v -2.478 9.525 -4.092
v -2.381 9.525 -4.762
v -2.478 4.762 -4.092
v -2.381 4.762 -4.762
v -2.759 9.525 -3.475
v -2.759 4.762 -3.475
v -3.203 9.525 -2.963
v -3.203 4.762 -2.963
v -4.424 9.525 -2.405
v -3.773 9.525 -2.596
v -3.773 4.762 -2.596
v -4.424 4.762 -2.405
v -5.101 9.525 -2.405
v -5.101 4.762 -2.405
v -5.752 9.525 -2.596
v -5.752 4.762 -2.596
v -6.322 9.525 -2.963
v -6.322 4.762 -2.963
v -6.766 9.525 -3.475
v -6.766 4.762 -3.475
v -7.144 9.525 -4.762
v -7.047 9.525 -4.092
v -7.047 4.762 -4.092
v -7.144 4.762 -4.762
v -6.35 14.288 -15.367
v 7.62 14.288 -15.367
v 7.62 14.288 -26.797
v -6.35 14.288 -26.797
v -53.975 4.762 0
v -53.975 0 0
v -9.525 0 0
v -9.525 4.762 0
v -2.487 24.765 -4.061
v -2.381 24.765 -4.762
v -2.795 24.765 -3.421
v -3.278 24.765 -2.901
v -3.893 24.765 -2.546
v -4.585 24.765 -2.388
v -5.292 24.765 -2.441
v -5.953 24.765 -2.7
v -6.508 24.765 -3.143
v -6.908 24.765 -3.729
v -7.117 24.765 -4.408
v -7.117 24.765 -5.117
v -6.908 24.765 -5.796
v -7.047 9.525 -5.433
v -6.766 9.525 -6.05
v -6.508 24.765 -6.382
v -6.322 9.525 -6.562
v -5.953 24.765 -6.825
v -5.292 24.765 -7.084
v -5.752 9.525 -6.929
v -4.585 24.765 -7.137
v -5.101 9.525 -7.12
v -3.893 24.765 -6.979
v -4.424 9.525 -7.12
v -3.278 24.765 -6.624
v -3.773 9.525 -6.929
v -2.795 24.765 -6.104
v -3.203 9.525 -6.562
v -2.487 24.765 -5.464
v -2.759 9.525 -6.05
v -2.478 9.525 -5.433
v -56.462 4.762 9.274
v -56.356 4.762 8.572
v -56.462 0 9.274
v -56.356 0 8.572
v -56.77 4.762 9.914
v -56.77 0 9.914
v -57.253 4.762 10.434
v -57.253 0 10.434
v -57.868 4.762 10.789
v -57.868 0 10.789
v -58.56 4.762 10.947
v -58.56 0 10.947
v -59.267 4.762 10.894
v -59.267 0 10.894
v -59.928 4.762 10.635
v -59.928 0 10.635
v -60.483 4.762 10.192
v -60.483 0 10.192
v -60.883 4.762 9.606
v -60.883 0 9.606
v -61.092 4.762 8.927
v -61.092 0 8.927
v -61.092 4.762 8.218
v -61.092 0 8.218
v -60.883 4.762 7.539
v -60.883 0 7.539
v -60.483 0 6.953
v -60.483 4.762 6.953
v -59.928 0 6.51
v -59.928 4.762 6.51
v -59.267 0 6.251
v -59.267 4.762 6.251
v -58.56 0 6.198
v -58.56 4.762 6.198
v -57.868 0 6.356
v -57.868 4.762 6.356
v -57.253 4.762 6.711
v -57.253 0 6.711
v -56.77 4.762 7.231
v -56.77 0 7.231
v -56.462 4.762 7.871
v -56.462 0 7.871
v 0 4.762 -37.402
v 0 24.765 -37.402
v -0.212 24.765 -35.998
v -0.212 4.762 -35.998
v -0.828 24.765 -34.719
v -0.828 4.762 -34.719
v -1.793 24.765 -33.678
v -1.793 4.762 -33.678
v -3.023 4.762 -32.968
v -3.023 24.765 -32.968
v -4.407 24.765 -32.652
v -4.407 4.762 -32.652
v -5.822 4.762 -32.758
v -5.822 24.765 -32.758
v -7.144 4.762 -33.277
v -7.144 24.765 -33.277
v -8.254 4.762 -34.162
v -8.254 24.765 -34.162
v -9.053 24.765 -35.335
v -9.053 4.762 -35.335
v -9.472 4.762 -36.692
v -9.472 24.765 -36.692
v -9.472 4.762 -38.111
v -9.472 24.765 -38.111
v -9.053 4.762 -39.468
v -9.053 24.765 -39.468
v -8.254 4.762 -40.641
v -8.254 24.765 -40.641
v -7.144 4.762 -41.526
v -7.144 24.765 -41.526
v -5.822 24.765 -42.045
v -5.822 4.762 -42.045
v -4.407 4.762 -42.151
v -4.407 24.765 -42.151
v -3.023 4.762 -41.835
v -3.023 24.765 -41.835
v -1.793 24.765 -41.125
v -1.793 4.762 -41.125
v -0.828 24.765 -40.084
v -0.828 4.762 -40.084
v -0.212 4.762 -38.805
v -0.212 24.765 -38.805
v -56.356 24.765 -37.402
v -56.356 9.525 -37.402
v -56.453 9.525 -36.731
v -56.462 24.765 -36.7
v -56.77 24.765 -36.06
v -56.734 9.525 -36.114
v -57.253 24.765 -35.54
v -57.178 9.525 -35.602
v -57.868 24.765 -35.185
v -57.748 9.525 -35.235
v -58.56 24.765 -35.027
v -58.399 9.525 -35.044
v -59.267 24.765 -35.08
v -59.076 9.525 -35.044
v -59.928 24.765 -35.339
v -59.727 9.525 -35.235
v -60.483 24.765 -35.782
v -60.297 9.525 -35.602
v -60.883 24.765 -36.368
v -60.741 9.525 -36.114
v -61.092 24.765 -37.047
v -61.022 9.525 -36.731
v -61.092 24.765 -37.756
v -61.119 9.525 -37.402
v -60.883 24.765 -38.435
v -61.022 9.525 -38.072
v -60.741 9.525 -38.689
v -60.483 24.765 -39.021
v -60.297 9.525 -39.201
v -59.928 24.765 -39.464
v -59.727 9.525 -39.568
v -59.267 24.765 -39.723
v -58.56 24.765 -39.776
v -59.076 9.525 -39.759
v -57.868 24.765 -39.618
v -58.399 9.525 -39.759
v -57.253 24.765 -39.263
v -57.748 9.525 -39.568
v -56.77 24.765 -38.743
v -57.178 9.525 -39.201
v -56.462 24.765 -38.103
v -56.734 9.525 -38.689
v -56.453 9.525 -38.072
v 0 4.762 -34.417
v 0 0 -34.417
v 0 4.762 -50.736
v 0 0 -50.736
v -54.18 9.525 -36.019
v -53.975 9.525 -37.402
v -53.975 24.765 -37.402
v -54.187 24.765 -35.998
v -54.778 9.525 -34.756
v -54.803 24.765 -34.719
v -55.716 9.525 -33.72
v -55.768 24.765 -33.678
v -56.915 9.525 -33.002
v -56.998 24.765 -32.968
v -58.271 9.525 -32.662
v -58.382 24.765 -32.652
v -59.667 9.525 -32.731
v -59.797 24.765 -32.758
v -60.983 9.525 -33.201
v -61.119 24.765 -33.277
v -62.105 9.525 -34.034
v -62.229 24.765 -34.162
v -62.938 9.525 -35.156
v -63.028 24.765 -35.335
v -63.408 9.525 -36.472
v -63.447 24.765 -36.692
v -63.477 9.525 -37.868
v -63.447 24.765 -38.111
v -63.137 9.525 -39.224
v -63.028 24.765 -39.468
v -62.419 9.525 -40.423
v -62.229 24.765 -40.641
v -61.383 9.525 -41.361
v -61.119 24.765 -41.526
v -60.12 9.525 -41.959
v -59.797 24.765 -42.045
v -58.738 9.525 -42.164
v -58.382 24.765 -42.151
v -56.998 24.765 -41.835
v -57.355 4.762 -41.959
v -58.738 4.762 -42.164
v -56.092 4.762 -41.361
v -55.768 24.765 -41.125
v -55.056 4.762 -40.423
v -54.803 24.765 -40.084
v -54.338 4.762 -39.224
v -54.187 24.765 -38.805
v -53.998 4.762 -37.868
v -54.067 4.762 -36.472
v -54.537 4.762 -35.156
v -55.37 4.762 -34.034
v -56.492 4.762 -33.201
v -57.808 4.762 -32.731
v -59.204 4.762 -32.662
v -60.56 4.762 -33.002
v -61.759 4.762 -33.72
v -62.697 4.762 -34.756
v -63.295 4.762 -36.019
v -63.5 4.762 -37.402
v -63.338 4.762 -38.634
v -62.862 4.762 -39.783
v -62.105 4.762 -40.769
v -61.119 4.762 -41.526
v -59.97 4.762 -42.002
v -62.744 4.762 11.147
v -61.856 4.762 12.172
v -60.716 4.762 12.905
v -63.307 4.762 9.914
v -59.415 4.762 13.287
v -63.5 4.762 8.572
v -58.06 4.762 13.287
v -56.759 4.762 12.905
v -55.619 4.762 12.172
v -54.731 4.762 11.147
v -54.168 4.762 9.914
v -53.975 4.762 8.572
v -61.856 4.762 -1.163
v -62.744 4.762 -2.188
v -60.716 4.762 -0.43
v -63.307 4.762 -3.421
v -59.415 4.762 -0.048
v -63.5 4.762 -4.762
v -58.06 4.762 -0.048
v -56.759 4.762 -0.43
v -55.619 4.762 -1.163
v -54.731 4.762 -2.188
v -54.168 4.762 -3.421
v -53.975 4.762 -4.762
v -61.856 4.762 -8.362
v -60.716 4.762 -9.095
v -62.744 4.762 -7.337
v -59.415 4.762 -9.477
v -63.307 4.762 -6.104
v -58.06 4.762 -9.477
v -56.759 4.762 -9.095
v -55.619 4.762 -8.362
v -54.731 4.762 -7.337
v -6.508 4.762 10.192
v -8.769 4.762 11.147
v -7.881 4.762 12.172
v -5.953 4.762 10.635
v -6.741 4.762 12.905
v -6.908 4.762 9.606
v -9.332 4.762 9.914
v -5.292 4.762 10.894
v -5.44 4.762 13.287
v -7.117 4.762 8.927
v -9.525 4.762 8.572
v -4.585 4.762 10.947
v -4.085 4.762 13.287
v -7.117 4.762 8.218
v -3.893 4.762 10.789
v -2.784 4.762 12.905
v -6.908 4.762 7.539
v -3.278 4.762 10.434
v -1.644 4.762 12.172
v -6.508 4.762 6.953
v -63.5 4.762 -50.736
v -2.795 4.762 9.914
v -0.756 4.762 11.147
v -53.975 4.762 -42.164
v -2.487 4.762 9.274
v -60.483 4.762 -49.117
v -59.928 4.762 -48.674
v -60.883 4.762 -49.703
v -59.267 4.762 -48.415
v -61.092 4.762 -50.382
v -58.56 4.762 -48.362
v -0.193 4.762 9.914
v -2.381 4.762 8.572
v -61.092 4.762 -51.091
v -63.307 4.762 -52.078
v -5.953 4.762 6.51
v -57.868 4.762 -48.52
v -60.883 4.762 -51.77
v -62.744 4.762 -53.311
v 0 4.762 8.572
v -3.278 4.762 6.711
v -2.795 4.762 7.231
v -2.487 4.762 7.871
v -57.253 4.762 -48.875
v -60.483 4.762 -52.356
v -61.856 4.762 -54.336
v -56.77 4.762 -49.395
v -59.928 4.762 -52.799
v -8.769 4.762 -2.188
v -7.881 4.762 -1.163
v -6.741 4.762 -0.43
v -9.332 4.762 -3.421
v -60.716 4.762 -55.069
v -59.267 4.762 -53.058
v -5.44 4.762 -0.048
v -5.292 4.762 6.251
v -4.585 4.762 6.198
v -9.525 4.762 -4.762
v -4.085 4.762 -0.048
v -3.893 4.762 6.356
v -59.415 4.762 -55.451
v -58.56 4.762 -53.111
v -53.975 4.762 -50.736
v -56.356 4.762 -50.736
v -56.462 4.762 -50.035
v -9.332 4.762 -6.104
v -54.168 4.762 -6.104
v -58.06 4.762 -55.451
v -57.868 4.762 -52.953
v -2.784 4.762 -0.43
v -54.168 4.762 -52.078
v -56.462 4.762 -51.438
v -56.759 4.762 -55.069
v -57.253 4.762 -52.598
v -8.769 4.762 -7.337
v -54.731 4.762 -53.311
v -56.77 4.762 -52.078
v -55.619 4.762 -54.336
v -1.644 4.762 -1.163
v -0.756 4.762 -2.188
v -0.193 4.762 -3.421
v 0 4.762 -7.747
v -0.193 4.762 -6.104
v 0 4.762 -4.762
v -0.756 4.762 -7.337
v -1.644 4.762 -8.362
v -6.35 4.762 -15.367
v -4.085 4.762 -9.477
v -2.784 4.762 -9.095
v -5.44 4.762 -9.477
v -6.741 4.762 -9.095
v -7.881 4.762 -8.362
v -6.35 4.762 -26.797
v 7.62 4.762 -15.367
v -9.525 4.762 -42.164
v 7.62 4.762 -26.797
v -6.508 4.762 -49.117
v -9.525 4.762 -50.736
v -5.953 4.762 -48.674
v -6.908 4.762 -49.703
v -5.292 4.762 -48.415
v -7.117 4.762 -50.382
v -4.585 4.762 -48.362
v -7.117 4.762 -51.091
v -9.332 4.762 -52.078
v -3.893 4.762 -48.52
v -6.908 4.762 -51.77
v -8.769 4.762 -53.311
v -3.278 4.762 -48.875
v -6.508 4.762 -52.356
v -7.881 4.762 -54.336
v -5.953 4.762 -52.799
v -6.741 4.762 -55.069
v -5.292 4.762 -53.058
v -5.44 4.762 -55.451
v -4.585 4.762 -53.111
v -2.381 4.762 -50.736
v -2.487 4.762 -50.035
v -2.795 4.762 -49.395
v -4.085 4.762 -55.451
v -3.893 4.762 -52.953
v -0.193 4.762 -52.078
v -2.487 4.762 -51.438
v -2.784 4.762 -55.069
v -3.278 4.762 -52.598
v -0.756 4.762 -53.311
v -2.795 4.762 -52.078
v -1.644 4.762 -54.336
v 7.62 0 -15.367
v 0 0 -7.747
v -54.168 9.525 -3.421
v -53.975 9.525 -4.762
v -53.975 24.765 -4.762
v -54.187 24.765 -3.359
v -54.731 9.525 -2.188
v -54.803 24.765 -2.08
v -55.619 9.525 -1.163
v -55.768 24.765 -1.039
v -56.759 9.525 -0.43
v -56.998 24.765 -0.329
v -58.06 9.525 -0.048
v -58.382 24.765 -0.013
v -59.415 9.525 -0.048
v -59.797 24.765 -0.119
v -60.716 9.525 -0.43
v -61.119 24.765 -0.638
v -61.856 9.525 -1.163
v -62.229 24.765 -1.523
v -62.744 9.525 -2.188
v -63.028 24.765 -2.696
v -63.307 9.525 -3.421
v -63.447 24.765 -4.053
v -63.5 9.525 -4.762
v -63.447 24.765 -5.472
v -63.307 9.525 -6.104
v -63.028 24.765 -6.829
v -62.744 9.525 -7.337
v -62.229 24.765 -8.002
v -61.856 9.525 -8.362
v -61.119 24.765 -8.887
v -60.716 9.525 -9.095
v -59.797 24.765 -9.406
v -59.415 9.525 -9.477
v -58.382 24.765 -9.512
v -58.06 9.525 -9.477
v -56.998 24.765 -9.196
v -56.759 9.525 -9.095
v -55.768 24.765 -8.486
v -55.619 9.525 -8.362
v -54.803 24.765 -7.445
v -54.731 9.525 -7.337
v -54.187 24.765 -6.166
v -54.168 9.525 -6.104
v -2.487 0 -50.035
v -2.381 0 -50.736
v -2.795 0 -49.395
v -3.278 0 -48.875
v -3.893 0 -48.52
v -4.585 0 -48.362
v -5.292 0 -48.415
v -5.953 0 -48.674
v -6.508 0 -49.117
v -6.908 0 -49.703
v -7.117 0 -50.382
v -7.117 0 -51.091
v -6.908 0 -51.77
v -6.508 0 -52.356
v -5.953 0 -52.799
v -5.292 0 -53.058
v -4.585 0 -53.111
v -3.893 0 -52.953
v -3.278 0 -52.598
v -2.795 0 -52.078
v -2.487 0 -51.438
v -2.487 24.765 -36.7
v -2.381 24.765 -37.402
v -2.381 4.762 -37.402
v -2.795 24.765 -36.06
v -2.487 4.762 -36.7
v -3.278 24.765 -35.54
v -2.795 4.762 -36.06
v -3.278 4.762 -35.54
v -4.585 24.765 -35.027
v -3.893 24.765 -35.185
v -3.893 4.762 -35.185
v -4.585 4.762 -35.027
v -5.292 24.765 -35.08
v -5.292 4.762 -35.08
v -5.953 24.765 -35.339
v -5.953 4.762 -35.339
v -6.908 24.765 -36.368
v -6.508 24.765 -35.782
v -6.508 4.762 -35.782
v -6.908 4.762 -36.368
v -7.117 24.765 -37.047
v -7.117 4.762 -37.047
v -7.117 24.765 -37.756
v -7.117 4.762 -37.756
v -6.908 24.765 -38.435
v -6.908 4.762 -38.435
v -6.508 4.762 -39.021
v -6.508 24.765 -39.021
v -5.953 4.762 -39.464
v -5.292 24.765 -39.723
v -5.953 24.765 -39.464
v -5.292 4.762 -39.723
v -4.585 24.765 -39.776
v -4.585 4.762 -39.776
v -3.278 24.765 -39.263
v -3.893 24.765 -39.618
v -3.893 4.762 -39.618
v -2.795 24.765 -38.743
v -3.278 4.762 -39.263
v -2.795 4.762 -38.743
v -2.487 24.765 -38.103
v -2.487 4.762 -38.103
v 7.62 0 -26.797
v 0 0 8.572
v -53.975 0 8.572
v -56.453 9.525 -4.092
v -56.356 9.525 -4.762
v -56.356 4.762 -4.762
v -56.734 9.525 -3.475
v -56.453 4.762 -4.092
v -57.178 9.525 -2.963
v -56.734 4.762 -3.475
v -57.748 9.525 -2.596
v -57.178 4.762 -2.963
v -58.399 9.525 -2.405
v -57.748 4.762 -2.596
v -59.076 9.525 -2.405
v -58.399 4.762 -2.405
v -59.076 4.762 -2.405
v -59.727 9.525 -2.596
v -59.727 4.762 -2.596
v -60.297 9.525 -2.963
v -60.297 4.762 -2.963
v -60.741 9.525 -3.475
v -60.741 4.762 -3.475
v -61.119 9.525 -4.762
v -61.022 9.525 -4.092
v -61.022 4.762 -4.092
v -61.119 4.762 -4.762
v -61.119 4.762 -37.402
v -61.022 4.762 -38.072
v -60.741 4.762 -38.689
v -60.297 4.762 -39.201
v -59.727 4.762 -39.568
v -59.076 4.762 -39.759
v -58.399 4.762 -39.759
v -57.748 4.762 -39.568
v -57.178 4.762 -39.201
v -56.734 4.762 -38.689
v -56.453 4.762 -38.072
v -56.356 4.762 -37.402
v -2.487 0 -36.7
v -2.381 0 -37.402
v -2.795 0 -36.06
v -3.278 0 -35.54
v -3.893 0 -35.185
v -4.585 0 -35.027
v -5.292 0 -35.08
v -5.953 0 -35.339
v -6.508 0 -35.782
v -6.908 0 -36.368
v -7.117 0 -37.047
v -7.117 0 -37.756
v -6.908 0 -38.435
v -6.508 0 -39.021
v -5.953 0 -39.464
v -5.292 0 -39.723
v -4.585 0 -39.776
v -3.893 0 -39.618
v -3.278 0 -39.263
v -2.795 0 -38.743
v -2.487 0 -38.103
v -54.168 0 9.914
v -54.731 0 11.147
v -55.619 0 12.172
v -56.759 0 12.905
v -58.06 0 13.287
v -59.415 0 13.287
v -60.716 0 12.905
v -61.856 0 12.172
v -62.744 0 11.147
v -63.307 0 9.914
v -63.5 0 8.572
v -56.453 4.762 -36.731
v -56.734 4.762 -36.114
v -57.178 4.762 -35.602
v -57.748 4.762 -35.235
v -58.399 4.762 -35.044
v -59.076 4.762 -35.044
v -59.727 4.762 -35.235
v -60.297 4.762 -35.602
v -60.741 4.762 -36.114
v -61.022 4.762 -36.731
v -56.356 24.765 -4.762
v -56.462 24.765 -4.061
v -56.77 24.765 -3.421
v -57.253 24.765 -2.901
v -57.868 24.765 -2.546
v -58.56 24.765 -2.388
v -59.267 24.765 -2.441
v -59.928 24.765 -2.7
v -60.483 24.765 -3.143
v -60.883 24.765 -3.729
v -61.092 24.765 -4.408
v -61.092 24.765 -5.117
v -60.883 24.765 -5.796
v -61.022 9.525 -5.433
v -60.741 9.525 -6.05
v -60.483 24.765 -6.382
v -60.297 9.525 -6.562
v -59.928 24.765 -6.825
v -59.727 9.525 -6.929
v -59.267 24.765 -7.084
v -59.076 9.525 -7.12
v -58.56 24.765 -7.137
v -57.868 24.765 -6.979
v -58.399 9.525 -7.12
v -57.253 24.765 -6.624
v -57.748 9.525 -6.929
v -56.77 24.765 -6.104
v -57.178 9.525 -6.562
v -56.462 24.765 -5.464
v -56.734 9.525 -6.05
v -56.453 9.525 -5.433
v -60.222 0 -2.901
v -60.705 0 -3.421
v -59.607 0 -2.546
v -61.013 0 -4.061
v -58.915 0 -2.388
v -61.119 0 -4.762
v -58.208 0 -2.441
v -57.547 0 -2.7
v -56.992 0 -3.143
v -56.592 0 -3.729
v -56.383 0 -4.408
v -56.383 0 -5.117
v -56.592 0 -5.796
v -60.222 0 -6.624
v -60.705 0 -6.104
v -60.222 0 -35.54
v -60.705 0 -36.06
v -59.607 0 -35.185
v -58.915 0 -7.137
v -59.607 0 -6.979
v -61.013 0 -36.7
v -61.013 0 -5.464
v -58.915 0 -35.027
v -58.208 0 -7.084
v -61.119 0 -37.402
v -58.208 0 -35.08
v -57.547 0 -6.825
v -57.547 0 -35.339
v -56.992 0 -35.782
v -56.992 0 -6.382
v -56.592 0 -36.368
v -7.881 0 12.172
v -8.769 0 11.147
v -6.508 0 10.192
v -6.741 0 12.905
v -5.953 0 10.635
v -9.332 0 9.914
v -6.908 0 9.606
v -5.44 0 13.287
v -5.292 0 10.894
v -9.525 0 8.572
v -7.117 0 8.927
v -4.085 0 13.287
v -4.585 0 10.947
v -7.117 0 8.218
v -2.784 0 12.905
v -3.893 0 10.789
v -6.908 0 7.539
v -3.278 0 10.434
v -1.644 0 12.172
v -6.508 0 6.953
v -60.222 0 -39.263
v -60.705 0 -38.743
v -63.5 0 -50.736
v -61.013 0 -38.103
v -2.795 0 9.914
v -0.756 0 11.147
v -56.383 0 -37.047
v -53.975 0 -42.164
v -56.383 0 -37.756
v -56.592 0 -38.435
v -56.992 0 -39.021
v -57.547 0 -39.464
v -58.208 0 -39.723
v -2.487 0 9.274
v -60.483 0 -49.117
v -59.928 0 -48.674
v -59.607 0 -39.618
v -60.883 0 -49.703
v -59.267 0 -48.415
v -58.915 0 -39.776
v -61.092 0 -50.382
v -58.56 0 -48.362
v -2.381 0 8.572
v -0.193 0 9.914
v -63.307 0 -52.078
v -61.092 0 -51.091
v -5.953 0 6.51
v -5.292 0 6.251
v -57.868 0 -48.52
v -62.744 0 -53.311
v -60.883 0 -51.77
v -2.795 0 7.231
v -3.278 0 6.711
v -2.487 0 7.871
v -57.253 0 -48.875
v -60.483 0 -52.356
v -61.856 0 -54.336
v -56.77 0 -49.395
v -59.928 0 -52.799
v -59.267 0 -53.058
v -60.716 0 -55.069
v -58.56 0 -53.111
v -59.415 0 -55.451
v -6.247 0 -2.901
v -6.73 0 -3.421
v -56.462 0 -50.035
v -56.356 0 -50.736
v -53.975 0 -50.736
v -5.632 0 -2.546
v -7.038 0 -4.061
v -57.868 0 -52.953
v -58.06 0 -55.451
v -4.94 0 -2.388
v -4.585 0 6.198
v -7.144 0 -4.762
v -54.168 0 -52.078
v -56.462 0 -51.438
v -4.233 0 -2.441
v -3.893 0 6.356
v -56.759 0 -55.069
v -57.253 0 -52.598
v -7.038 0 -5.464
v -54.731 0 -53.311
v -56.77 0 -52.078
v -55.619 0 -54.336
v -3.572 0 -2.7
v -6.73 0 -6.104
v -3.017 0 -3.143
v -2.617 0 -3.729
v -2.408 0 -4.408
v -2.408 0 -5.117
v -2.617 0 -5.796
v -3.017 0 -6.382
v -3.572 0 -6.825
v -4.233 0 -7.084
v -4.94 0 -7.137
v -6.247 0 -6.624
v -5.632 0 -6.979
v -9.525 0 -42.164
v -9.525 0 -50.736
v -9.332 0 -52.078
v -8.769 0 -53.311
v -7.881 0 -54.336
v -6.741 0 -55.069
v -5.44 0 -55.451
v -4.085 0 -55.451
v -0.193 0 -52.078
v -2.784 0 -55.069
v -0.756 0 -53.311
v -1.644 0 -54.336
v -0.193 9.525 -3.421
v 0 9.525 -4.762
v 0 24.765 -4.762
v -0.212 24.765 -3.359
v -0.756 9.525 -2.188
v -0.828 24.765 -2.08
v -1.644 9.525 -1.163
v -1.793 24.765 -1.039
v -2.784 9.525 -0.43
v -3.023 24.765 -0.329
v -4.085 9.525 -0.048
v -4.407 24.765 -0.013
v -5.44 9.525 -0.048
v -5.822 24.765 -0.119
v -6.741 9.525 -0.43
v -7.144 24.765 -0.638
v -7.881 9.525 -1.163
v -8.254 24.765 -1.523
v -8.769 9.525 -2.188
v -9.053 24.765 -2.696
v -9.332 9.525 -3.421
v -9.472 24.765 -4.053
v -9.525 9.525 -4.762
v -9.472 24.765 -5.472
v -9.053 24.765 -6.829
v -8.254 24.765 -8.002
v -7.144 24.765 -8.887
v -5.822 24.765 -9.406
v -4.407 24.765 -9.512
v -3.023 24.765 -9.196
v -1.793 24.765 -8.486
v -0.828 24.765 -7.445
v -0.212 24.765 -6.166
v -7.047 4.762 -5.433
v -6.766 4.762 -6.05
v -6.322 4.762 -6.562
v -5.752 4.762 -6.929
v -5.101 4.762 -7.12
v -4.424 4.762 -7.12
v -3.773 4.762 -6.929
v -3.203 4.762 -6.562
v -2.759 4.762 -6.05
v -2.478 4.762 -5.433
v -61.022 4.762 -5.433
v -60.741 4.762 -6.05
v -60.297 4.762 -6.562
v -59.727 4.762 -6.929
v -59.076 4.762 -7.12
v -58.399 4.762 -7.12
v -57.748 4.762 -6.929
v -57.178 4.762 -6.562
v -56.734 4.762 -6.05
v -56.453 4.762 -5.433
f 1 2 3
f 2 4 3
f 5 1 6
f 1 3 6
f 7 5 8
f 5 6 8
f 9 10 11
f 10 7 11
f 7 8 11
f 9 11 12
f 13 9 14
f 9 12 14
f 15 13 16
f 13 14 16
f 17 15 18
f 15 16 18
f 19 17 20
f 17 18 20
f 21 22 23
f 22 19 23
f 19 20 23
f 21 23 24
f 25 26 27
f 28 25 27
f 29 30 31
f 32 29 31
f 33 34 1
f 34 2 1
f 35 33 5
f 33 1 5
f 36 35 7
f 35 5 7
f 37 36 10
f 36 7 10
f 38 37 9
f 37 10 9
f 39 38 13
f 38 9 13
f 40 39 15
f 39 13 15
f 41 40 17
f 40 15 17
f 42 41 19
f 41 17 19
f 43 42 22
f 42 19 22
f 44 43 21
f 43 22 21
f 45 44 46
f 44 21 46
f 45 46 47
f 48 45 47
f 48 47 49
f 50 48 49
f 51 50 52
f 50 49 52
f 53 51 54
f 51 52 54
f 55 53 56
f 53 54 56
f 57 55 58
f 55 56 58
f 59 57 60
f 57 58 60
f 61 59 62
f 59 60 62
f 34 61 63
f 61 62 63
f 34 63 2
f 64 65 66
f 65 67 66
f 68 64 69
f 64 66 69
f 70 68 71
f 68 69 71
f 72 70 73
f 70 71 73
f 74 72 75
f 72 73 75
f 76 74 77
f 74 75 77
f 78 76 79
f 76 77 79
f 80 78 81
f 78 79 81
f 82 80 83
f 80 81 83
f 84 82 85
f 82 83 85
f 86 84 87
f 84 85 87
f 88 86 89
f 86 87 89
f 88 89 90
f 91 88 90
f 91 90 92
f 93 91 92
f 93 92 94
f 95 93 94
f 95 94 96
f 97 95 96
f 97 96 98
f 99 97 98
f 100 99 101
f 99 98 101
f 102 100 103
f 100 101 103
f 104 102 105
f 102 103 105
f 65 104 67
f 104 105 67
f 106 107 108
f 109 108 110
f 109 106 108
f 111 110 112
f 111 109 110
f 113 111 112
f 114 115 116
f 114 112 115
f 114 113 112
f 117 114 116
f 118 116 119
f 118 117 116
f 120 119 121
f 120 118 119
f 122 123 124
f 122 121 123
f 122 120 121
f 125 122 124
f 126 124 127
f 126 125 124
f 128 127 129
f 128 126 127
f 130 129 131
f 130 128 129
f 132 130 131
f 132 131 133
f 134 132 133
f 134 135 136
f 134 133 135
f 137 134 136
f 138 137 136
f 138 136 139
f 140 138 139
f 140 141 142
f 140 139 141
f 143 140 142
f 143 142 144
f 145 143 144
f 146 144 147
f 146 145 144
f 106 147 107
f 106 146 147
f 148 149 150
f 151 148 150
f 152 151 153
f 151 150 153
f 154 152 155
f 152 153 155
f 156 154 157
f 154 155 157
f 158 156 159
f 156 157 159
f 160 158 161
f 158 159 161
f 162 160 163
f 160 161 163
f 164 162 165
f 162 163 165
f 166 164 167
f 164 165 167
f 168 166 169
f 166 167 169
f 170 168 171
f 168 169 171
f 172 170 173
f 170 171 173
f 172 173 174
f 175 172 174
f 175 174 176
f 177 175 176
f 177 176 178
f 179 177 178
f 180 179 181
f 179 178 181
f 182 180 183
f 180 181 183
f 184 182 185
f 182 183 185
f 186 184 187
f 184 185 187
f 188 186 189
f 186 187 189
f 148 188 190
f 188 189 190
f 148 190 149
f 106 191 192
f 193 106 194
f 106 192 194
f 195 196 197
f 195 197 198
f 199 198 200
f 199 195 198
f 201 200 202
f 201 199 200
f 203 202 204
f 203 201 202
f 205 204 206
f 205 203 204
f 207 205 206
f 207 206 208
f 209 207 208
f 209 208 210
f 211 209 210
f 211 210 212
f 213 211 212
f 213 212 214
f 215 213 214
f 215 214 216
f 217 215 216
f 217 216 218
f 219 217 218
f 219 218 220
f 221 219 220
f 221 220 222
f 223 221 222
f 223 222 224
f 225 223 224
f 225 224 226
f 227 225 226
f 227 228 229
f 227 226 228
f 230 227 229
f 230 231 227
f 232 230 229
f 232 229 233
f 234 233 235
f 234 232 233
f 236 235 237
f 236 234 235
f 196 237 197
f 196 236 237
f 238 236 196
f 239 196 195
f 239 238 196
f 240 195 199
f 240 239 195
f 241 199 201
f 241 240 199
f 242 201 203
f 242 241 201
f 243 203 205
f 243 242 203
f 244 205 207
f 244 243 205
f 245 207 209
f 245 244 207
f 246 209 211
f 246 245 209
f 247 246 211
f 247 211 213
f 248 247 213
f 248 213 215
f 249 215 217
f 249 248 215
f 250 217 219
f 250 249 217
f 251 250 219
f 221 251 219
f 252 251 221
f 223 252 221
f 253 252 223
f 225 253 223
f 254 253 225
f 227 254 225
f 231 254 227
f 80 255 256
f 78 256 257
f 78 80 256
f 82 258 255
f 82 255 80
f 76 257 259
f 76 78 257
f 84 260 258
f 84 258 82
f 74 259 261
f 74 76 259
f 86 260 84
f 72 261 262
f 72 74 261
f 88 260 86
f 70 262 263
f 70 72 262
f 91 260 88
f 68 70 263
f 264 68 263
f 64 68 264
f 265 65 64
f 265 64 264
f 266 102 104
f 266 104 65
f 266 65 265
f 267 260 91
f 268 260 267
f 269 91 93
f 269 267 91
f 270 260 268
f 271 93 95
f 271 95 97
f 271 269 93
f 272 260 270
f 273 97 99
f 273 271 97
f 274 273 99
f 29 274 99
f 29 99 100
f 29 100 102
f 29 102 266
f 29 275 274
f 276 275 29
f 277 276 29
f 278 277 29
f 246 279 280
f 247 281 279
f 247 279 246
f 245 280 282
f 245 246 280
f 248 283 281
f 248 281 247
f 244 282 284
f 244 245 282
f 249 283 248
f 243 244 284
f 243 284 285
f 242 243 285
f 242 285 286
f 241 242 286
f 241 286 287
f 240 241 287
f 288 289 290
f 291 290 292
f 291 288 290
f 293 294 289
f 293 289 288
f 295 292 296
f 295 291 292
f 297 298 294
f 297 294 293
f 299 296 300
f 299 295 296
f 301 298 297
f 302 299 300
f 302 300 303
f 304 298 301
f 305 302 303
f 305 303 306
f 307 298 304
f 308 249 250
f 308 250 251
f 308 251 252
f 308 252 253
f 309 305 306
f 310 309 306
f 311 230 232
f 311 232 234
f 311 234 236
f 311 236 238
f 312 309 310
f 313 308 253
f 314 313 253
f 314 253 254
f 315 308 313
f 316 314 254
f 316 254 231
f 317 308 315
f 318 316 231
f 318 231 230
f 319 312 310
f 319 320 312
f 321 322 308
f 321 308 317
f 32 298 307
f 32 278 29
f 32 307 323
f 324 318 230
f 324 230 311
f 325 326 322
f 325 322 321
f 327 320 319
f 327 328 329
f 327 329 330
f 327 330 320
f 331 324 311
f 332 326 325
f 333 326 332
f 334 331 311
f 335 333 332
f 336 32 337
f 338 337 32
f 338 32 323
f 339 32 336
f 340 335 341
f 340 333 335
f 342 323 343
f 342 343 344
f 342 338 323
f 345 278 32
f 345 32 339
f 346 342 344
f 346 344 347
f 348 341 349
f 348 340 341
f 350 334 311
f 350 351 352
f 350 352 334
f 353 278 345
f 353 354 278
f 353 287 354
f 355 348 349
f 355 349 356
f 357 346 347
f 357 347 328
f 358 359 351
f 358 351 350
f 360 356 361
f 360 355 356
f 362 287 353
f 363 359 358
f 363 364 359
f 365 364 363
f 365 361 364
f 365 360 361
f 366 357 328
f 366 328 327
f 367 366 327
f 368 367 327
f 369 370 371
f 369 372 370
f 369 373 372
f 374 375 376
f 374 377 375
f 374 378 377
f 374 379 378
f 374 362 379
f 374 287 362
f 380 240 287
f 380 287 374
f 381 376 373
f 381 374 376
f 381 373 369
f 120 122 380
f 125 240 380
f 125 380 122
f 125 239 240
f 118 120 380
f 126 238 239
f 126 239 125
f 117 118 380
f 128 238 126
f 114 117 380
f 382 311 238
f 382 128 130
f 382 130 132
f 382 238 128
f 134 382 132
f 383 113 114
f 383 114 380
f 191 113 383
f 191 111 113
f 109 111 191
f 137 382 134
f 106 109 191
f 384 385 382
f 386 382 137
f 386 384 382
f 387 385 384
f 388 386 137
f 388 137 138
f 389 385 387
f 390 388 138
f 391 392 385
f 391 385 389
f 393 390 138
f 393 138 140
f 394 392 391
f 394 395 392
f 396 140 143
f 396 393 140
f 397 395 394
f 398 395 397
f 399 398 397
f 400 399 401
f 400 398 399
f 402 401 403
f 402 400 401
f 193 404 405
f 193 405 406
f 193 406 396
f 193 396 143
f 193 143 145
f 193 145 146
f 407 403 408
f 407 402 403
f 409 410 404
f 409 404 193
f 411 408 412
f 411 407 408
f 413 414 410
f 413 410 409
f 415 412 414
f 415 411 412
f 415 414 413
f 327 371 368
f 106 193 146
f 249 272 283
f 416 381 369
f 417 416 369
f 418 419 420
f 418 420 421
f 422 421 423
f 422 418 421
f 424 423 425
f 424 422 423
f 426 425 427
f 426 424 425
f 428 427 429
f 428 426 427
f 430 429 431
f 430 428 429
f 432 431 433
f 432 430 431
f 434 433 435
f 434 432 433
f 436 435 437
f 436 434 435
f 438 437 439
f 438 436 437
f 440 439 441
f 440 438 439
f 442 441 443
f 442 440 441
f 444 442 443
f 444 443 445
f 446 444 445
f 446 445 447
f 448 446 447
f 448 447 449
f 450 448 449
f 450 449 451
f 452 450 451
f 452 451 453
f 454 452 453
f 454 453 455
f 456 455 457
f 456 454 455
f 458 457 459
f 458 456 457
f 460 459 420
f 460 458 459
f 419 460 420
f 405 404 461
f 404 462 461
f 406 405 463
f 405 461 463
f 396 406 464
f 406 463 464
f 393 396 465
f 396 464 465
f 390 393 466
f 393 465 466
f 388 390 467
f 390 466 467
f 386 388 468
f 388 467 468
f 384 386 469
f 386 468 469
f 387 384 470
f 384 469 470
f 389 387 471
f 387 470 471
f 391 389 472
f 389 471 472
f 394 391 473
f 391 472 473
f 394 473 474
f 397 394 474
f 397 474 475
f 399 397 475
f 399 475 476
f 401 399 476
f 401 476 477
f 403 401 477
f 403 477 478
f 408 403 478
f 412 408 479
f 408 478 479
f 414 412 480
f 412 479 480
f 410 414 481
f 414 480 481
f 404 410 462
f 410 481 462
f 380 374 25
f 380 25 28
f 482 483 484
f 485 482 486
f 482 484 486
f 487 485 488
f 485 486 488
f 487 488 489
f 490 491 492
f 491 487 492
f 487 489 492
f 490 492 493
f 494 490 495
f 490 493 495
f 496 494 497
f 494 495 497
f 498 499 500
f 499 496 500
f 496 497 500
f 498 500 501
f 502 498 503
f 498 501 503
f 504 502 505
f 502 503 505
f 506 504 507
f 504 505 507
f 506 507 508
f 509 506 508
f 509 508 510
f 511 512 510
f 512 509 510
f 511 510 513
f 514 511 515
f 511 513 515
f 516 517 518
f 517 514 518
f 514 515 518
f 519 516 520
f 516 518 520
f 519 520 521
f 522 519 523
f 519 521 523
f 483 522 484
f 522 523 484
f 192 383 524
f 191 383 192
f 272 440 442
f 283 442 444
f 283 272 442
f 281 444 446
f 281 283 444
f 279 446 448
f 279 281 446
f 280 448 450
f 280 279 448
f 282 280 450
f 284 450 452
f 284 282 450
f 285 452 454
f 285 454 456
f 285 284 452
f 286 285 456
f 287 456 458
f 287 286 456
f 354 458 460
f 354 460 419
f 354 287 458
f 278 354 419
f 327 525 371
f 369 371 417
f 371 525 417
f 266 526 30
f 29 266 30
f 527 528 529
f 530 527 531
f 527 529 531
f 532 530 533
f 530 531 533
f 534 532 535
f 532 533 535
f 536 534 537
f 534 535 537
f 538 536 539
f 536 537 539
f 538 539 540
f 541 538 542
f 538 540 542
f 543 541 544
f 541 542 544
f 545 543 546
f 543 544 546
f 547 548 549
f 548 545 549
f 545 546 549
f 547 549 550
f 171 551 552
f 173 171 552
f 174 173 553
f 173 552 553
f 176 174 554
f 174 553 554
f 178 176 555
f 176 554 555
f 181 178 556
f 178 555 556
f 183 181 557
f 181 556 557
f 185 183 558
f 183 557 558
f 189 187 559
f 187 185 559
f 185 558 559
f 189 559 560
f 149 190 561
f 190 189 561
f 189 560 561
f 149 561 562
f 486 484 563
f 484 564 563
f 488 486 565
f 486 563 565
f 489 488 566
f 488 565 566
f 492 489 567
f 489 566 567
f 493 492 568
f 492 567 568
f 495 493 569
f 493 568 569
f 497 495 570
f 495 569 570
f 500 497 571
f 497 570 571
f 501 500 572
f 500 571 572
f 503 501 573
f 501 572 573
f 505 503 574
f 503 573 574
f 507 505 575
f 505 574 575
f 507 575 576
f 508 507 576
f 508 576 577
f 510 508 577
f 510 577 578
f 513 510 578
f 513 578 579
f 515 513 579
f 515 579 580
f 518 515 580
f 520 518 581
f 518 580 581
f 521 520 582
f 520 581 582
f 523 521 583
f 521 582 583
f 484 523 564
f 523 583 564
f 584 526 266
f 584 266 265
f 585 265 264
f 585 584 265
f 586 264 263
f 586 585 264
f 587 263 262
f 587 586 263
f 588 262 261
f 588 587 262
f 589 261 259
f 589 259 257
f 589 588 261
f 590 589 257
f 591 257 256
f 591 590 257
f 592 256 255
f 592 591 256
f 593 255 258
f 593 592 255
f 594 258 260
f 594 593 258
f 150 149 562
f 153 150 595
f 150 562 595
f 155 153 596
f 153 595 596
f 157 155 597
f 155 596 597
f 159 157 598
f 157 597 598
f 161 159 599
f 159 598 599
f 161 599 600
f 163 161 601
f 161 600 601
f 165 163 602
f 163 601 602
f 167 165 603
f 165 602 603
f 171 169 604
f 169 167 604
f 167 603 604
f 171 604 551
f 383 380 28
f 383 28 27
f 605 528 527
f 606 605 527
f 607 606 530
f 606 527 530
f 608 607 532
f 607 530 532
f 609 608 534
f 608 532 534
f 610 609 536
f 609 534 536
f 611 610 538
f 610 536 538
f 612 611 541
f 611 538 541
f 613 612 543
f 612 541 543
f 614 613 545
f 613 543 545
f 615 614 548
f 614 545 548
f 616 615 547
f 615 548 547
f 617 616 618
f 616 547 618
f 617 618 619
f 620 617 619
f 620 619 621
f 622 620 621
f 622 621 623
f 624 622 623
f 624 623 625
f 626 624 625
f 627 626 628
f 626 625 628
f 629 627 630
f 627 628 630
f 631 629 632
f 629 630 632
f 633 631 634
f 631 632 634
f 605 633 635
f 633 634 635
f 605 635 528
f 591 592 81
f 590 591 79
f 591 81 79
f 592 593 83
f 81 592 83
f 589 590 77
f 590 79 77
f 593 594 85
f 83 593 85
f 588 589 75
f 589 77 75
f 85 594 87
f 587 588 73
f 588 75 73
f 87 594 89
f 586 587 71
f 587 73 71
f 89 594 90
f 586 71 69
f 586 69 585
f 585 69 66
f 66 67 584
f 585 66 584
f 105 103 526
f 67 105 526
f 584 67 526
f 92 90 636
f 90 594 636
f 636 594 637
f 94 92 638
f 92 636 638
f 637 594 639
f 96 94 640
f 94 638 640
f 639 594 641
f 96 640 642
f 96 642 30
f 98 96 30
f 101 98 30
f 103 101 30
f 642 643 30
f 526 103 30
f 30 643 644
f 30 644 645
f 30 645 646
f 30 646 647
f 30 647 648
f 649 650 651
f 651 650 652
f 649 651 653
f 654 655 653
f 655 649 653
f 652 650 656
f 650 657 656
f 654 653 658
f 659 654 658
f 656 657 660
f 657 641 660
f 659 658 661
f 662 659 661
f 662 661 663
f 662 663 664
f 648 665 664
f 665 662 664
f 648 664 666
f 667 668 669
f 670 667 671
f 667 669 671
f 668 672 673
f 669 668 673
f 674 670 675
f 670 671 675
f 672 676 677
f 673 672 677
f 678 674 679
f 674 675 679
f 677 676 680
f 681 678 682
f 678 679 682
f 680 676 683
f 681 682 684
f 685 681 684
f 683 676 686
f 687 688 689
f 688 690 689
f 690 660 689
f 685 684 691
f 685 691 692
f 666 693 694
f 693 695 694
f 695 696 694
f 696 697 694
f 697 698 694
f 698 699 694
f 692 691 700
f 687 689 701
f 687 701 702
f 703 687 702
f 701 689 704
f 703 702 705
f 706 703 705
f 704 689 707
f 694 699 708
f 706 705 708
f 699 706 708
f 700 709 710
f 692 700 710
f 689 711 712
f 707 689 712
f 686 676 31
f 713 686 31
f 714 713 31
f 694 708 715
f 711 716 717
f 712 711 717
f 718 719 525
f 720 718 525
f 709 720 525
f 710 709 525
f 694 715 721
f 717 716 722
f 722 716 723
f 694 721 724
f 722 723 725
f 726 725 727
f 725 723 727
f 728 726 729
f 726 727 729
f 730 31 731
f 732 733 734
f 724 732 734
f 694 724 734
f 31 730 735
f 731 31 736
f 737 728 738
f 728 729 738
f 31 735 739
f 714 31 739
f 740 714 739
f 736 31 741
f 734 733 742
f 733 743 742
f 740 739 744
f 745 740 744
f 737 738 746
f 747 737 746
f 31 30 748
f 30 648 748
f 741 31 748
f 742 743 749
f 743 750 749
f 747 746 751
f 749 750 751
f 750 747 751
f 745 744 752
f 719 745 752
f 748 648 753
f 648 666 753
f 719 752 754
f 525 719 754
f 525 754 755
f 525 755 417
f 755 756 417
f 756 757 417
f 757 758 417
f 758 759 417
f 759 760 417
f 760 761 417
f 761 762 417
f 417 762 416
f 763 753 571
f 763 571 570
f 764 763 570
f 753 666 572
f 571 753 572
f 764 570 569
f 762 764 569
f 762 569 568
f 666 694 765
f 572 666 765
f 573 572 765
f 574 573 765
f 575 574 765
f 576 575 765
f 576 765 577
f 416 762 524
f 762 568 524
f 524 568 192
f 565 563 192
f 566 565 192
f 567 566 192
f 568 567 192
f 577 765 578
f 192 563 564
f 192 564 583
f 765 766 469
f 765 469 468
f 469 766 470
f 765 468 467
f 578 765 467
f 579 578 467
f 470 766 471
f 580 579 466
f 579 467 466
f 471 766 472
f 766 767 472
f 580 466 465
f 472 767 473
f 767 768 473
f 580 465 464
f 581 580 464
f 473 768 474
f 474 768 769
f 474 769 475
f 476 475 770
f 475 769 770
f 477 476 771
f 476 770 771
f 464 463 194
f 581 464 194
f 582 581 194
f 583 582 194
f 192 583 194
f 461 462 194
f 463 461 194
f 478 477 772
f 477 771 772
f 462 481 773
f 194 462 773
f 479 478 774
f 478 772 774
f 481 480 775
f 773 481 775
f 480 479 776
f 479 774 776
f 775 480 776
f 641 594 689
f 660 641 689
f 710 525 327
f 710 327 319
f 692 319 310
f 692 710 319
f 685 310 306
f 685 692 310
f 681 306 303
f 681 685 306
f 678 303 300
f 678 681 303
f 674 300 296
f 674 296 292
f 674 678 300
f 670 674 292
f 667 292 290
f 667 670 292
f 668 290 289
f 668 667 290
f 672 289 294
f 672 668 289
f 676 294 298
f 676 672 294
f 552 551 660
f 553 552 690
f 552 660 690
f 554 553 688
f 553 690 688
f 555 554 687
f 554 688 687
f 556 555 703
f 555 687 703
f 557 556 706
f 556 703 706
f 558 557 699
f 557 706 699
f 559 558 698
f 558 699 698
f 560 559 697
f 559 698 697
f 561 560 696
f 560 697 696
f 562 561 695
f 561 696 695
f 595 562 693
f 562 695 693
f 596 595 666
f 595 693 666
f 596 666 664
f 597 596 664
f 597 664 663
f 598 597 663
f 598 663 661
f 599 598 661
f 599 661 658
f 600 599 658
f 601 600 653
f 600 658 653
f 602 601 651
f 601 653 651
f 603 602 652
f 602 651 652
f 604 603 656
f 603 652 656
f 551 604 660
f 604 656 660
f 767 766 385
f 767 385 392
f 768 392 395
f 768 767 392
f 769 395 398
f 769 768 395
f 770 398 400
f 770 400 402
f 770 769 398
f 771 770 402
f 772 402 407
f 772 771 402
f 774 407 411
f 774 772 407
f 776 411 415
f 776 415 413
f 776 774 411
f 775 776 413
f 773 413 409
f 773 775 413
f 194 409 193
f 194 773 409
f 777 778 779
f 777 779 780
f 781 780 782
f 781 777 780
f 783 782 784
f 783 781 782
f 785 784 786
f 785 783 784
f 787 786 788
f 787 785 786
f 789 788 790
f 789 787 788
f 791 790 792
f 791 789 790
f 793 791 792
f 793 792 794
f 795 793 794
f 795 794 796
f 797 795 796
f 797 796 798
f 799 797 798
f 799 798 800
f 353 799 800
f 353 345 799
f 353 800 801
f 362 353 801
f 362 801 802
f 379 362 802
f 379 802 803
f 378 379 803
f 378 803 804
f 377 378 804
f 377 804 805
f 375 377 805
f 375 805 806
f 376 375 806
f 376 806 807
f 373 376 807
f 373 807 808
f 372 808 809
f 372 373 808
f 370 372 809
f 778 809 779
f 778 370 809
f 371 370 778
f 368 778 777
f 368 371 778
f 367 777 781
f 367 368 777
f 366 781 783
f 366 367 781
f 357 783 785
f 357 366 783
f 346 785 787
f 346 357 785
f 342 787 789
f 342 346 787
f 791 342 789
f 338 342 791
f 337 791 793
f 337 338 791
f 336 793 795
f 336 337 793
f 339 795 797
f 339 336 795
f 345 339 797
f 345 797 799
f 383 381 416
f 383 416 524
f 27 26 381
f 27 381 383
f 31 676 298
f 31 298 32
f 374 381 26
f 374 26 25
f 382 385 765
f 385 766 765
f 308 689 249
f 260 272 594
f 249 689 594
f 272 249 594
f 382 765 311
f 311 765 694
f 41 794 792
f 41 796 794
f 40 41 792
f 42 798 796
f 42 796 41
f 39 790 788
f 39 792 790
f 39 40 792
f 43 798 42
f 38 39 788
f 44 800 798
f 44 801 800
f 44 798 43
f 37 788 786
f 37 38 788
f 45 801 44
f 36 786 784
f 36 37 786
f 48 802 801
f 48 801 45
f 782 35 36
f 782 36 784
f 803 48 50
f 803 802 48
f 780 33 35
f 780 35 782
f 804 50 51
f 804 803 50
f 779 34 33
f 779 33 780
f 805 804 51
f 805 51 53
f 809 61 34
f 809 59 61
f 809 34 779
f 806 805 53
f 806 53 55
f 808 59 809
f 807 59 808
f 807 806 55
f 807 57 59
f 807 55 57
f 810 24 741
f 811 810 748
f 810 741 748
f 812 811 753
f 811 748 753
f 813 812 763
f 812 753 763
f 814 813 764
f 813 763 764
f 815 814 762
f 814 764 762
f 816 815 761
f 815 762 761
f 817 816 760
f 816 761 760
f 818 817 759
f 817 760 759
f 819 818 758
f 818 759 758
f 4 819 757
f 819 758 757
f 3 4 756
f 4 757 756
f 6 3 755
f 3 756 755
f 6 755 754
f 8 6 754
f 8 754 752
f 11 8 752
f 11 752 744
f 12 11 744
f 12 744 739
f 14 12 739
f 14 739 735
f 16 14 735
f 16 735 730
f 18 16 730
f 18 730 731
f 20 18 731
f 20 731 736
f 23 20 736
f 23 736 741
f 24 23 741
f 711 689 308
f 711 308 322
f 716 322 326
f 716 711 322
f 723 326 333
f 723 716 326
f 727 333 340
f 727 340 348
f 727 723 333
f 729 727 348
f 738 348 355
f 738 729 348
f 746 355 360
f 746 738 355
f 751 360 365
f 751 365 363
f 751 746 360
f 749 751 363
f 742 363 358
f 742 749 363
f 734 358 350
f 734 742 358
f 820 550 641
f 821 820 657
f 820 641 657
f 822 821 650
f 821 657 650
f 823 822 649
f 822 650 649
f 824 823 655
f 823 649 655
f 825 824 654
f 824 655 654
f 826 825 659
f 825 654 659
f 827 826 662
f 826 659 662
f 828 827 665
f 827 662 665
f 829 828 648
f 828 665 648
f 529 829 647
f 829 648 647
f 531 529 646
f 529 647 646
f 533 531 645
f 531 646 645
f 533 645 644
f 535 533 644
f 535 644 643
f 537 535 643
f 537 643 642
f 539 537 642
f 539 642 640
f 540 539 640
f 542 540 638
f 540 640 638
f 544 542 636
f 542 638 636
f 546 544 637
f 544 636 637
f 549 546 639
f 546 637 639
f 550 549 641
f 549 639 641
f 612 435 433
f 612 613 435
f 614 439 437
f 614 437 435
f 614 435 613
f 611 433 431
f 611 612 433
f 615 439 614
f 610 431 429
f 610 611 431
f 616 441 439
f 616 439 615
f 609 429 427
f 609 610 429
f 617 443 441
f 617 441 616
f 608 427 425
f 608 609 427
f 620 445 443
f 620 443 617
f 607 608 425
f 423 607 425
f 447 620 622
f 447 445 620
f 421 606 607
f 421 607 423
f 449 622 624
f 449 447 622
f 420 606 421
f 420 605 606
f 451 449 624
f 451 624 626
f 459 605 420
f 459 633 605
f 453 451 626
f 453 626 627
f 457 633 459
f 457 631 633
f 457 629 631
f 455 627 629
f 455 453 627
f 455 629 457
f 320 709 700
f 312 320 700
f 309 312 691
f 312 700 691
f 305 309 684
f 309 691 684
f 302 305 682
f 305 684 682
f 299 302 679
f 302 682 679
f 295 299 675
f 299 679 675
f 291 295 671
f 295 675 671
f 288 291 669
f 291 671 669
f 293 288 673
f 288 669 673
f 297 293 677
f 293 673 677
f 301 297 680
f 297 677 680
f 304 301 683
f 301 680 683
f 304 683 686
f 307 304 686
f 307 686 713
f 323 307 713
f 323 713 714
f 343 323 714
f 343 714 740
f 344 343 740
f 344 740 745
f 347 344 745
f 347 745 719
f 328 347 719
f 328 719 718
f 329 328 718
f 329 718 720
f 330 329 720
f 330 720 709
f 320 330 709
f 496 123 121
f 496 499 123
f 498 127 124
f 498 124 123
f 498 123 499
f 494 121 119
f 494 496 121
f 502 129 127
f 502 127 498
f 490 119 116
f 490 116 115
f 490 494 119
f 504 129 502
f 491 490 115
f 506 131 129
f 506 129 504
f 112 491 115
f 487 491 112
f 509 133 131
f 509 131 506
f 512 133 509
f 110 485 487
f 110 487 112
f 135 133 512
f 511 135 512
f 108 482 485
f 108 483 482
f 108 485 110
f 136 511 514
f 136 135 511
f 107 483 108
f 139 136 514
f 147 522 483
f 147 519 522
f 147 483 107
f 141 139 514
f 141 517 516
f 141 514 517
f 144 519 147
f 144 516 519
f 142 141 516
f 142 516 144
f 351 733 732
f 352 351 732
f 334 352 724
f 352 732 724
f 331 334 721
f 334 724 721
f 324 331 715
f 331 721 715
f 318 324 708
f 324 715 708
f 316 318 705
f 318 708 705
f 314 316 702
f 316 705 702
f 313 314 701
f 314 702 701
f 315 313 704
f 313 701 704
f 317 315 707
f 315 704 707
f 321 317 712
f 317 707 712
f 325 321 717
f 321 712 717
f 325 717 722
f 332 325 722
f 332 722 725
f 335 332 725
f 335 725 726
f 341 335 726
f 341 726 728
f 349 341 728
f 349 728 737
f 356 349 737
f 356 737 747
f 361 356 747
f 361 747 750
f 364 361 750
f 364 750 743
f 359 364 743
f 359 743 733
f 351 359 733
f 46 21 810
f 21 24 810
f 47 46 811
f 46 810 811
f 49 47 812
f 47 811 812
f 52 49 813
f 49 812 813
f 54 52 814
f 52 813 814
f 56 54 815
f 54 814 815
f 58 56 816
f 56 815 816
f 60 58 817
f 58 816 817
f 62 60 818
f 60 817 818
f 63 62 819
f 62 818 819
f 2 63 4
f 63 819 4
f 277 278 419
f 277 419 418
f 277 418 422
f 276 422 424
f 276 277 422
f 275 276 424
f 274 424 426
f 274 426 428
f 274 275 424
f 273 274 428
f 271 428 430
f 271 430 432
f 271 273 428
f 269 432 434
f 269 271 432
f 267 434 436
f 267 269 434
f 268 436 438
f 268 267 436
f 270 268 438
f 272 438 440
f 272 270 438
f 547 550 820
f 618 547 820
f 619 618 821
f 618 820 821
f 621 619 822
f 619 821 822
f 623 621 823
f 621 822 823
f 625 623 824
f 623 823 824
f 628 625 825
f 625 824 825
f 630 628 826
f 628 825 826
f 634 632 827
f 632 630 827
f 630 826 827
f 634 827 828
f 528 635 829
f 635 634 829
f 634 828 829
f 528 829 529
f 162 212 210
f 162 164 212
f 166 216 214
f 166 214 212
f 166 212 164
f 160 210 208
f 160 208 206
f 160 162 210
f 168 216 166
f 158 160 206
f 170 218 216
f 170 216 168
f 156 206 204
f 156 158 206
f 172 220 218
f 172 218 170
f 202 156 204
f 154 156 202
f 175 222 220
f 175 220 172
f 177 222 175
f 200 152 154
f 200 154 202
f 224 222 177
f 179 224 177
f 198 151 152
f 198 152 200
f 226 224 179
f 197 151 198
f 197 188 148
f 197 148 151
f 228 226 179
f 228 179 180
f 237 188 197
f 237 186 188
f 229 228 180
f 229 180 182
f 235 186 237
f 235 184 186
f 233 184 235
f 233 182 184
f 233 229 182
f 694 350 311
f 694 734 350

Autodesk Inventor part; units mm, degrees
ref_plane "YZ Plane" through (0, 0, 0) normal (1, 0, 0) x (0, 1, 0)
ref_plane "XZ Plane" through (0, 0, 0) normal (0, 1, 0) x (-1, 0, 0)
ref_plane "XY Plane" through (0, 0, 0) normal (0, 0, 1) x (1, 0, 0)
sketch "Sketch1" plane through (0, 0, 0) normal (0, 1, 0) x (-1, 0, 0)
  point P0 (0, 0)
sketch "Sketch2" plane through (0, 0, 0) normal (0, 1, 0) x (-1, 0, 0)
  line L0 (0, -4.7625) -> (0, -37.4015)
  line L1 (4.7625, -42.164) -> (58.7375, -42.164)
  line L2 (63.5, -37.4015) -> (63.5, -4.7625)
  line L3 (58.7375, 0) -> (4.7625, 0)
  arc A0 (4.7625, 0) -> (0, -4.7625) centre (4.7625, -4.7625) ccw
  circle A1 centre (4.7625, -4.7625) radius 4.7625
  circle A2 centre (4.7625, -4.7625) radius 2.3813
  arc A3 (0, -37.4015) -> (4.7625, -42.164) centre (4.7625, -37.4015) ccw
  arc A4 (58.7375, -42.164) -> (63.5, -37.4015) centre (58.7375, -37.4015) ccw
  arc A5 (63.5, -4.7625) -> (58.7375, 0) centre (58.7375, -4.7625) ccw
  circle A6 centre (58.7375, -4.7625) radius 4.7625
  circle A7 centre (58.7375, -37.4015) radius 4.7625
  circle A8 centre (58.7375, -4.7625) radius 2.3813
  circle A9 centre (58.7375, -37.4015) radius 2.3813
  point P0 (0, 0)
  point P1 (0, -42.164)
  point P2 (63.5, -42.164)
  point P3 (4.7625, 0)
  point P4 (4.7625, 0)
  dimension "d0" = 42.164
  dimension "d1" = 63.5
  dimension "d2" = 4.7625
  dimension "d3" = 4.7625
  dimension "d4" = 4.7625
  dimension "d5" = 4.7625
  dimension "d6" = 4.7625
extrude "Extrusion1" add sketch "Sketch2" along normal blind 9.525 contours A0 A1 | A5 A6 | A7 A4
extrude "Extrusion2" add sketch "Sketch2" along normal blind 4.7625 contours A1 L3 A6 L2 A7 L1 A3 L0
sketch "Sketch3" plane through (0, 4.7625, 0) normal (0, 1, 0) x (1, 0, 0)
  circle A0 centre (-4.7625, 4.7625) radius 2.3813 projected
  line L0 (-4.7625, 4.7625) -> (-1.3949, 1.3949)
  circle A1 centre (-4.7625, 4.7625) radius 4.7625 projected
  line L1 (-4.7625, 4.7625) -> (0, 4.7625) construction
  circle A2 centre (-4.7625, 4.7625) radius 4.7625
  circle A3 centre (-4.7625, 4.7625) radius 2.3813
  circle A4 centre (-58.7375, 4.7625) radius 4.7625 projected
  circle A5 centre (-58.7375, 4.7625) radius 4.7625
  circle A6 centre (-58.7375, 4.7625) radius 2.3813
  circle A7 centre (-58.7375, 37.4015) radius 2.3813 projected
  circle A8 centre (-58.7375, 37.4015) radius 4.7625
  circle A9 centre (-58.7375, 37.4015) radius 2.3813 projected
  circle A10 centre (-58.7375, 37.4015) radius 2.3813
  point P0 (0, 0)
  dimension "d22" = 45
extrude "Extrusion3" add sketch "Sketch3" along normal blind 20.0025
sketch "Sketch4" plane through (0, 4.7625, 0) normal (0, 1, 0) x (1, 0, 0)
  line L0 (0, 4.7625) -> (0, 37.4015) projected
  line L1 (0, 21.082) -> (0, 26.797)
  line L2 (0, 26.797) -> (0, 21.082)
  line L3 (0, 21.082) -> (0, 15.367)
  line L4 (0, 15.367) -> (7.62, 15.367)
  line L5 (7.62, 15.367) -> (7.62, 26.797)
  line L6 (7.62, 26.797) -> (0, 26.797)
  line L7 (7.62, 26.797) -> (0, 34.417)
  line L8 (7.62, 26.797) -> (18.3963, 26.797) construction
  line L9 (7.62, 15.367) -> (0, 7.747)
  line L10 (7.62, 15.367) -> (18.3963, 15.367) construction
  point P0 (0, 0)
  dimension "d25" = 5.715
  dimension "d26" = 5.715
  dimension "d27" = 7.62
  dimension "d28" = 135
  dimension "d29" = 135
extrude "Extrusion4" add sketch "Sketch4" against normal blind 4.7625
sketch "Sketch5" plane through (0, 4.7625, 0) normal (0, 1, 0) x (1, 0, 0)
  line L0 (7.62, 26.797) -> (7.62, 15.367) projected
  line L1 (7.62, 15.367) -> (-6.35, 15.367)
  line L2 (-6.35, 15.367) -> (-6.35, 26.797)
  line L3 (-6.35, 26.797) -> (7.62, 26.797)
  line L4 (0, 7.747) -> (7.62, 15.367) projected
  line L5 (7.62, 15.367) -> (7.62, 26.797) projected
  line L6 (7.62, 15.367) -> (7.62, 26.797)
  point P0 (0, 0)
  dimension "d32" = 13.97
sketch "Sketch6" plane through (0, 4.7625, 0) normal (0, 1, 0) x (1, 0, 0)
  point P0 (0, 0)
extrude "Extrusion5" add sketch "Sketch5" along normal blind 9.525
sketch "Sketch7" plane through (7.62, 0, -15.367) normal (1, 0, 0) x (0, 0, -1)
  line L0 (0, 4.7625) -> (11.43, 4.7625) projected
  line L1 (5.715, 4.7625) -> (5.715, 17.145)
  circle A0 centre (5.715, 17.145) radius 5.715
  point P0 (-15.367, 0)
  dimension "d35" = 12.3825
  dimension "d36" = 11.43
extrude "Extrusion6" cut sketch "Sketch7" against normal blind 9.9441
sketch "Sketch8" plane through (0, 4.7625, 0) normal (0, 1, 0) x (1, 0, 0)
  line L0 (-58.7375, 0) -> (-4.7625, 0) projected
  line L1 (-31.75, 0) -> (-31.75, 42.164)
  line L2 (-4.7625, 42.164) -> (-58.7375, 42.164) projected
  circle A0 centre (-31.75, 21.082) radius 2.3812
  point P0 (0, 0)
  dimension "d39" = 4.7625
extrude "Extrusion7" cut sketch "Sketch8" against normal blind 9.9441
sketch "Sketch9" plane through (0, 0, 0) normal (0, -1, 0) x (1, 0, 0)
  arc A0 (-4.7625, -42.164) -> (0, -37.4015) centre (-4.7625, -37.4015) ccw projected
  circle A1 centre (-4.7625, -37.4015) radius 2.3813
  circle A2 centre (-4.7625, -4.7625) radius 2.3813 projected
  point P0 (0, 0)
extrude "Extrusion8" cut sketch "Sketch9" against normal up to surface (4.7625 mm away) contours A1
sketch "Sketch10" plane through (0, 4.7625, 0) normal (0, 1, 0) x (1, 0, 0)
  circle A0 centre (-4.7625, 37.4015) radius 2.3813 projected
  circle A1 centre (-4.7625, 37.4015) radius 4.7625
  point P0 (0, 0)
extrude "Extrusion9" add sketch "Sketch10" along normal up to surface (20.0025 mm away)
sketch "Sketch11" plane through (0, 4.7625, 0) normal (0, 1, 0) x (1, 0, 0)
  circle A0 centre (-31.75, 21.082) radius 2.3812 projected
  circle A1 centre (-31.75, 21.082) radius 2.3812
  point P0 (0, 0)
extrude "Extrusion10" add sketch "Sketch11" against normal up to surface (4.7625 mm away)
sketch "Sketch12" plane through (-2.3241, 0, -15.367) normal (1, 0, 0) x (0, 0, -1)
  arc A0 (0.7657, 14.2875) -> (10.6643, 14.2875) centre (5.715, 17.145) ccw projected
  circle A1 centre (5.715, 17.145) radius 5.715
  line L0 (0.7657, 14.2875) -> (10.6643, 14.2875)
  line L1 (11.43, 14.2875) -> (0, 14.2875) projected
  point P0 (-15.367, 0)
extrude "Extrusion11" add sketch "Sketch12" along normal up to surface (9.9441 mm away) contours L0 A0
sketch "Sketch13" plane through (0, 0, 0) normal (0, -1, 0) x (1, 0, 0)
  arc A0 (-58.7375, 0) -> (-63.5, -4.7625) centre (-58.7375, -4.7625) ccw projected
  line L0 (-63.5, -4.7625) -> (-63.5, 0)
  line L1 (-63.5, 0) -> (-63.5, 3.81)
  circle A1 centre (-58.7375, 8.5725) radius 4.7625
  arc A2 (-63.5, -4.7625) -> (-58.7375, 0) centre (-58.7375, -4.7625) ccw projected
  line L2 (-63.5, 3.81) -> (-53.975, 3.81)
  line L3 (-53.975, 3.81) -> (-53.975, 0)
  line L4 (-58.7375, 0) -> (-4.7625, 0) projected
  line L5 (-63.5, 8.5725) -> (-63.5, 3.81)
  circle A3 centre (-58.7375, 8.5725) radius 2.3813
  circle A4 centre (-58.7375, -4.7625) radius 2.3813 projected
  line L6 (-53.975, 8.5725) -> (-53.975, 3.81)
  circle A5 centre (-4.7625, 8.5725) radius 2.3813
  circle A6 centre (-4.7625, 8.5725) radius 4.7625
  circle A7 centre (-4.7625, -4.7625) radius 2.3813 projected
  arc A8 (0, -4.7625) -> (-4.7625, 0) centre (-4.7625, -4.7625) ccw projected
  line L7 (0, -4.7625) -> (0, 8.5725)
  line L8 (-9.525, 8.5725) -> (-9.525, 0)
  circle A9 centre (-58.7375, -50.7365) radius 2.3813
  circle A10 centre (-58.7375, -50.7365) radius 4.7625
  circle A11 centre (-58.7375, -37.4015) radius 2.3813 projected
  arc A12 (-63.5, -37.4015) -> (-58.7375, -42.164) centre (-58.7375, -37.4015) ccw projected
  line L9 (-63.5, -37.4015) -> (-63.5, -50.7365)
  line L10 (-63.5, -37.4015) -> (-63.5, -4.7625) projected
  line L11 (-53.975, -50.7365) -> (-53.975, -42.164)
  line L12 (-4.7625, -42.164) -> (-58.7375, -42.164) projected
  circle A13 centre (-4.7625, -50.7365) radius 2.3813
  circle A14 centre (-4.7625, -50.7365) radius 4.7625
  circle A15 centre (-4.7625, -37.4015) radius 2.3813 projected
  arc A16 (-4.7625, -42.164) -> (0, -37.4015) centre (-4.7625, -37.4015) ccw projected
  line L13 (0, -37.4015) -> (0, -50.7365)
  line L14 (0, -34.417) -> (0, -37.4015) projected
  line L15 (-9.525, -50.7365) -> (-9.525, -42.164)
  point P0 (0, 0)
  point P1 (0, -50.7365)
  point P2 (0, 8.5725)
  dimension "d50" = 3.81
  dimension "d51" = 9.525
  dimension "d52" = 13.335
  dimension "d53" = 13.335
  dimension "d54" = 13.335
  dimension "d55" = 13.335
extrude "Extrusion12" add sketch "Sketch13" against normal up to surface (4.7625 mm away) contours A0 L0 L1 L2 L3 L4 | L2 A1 L6 | L5 A1 L2 | A1 | L8 A6 L7 A8 L4 | A6 | A10 | A10 L9 A12 L12 L11 | A16 L13 A14 L15 L12 | A14
properties part number "MotorBot_3DPrint"
